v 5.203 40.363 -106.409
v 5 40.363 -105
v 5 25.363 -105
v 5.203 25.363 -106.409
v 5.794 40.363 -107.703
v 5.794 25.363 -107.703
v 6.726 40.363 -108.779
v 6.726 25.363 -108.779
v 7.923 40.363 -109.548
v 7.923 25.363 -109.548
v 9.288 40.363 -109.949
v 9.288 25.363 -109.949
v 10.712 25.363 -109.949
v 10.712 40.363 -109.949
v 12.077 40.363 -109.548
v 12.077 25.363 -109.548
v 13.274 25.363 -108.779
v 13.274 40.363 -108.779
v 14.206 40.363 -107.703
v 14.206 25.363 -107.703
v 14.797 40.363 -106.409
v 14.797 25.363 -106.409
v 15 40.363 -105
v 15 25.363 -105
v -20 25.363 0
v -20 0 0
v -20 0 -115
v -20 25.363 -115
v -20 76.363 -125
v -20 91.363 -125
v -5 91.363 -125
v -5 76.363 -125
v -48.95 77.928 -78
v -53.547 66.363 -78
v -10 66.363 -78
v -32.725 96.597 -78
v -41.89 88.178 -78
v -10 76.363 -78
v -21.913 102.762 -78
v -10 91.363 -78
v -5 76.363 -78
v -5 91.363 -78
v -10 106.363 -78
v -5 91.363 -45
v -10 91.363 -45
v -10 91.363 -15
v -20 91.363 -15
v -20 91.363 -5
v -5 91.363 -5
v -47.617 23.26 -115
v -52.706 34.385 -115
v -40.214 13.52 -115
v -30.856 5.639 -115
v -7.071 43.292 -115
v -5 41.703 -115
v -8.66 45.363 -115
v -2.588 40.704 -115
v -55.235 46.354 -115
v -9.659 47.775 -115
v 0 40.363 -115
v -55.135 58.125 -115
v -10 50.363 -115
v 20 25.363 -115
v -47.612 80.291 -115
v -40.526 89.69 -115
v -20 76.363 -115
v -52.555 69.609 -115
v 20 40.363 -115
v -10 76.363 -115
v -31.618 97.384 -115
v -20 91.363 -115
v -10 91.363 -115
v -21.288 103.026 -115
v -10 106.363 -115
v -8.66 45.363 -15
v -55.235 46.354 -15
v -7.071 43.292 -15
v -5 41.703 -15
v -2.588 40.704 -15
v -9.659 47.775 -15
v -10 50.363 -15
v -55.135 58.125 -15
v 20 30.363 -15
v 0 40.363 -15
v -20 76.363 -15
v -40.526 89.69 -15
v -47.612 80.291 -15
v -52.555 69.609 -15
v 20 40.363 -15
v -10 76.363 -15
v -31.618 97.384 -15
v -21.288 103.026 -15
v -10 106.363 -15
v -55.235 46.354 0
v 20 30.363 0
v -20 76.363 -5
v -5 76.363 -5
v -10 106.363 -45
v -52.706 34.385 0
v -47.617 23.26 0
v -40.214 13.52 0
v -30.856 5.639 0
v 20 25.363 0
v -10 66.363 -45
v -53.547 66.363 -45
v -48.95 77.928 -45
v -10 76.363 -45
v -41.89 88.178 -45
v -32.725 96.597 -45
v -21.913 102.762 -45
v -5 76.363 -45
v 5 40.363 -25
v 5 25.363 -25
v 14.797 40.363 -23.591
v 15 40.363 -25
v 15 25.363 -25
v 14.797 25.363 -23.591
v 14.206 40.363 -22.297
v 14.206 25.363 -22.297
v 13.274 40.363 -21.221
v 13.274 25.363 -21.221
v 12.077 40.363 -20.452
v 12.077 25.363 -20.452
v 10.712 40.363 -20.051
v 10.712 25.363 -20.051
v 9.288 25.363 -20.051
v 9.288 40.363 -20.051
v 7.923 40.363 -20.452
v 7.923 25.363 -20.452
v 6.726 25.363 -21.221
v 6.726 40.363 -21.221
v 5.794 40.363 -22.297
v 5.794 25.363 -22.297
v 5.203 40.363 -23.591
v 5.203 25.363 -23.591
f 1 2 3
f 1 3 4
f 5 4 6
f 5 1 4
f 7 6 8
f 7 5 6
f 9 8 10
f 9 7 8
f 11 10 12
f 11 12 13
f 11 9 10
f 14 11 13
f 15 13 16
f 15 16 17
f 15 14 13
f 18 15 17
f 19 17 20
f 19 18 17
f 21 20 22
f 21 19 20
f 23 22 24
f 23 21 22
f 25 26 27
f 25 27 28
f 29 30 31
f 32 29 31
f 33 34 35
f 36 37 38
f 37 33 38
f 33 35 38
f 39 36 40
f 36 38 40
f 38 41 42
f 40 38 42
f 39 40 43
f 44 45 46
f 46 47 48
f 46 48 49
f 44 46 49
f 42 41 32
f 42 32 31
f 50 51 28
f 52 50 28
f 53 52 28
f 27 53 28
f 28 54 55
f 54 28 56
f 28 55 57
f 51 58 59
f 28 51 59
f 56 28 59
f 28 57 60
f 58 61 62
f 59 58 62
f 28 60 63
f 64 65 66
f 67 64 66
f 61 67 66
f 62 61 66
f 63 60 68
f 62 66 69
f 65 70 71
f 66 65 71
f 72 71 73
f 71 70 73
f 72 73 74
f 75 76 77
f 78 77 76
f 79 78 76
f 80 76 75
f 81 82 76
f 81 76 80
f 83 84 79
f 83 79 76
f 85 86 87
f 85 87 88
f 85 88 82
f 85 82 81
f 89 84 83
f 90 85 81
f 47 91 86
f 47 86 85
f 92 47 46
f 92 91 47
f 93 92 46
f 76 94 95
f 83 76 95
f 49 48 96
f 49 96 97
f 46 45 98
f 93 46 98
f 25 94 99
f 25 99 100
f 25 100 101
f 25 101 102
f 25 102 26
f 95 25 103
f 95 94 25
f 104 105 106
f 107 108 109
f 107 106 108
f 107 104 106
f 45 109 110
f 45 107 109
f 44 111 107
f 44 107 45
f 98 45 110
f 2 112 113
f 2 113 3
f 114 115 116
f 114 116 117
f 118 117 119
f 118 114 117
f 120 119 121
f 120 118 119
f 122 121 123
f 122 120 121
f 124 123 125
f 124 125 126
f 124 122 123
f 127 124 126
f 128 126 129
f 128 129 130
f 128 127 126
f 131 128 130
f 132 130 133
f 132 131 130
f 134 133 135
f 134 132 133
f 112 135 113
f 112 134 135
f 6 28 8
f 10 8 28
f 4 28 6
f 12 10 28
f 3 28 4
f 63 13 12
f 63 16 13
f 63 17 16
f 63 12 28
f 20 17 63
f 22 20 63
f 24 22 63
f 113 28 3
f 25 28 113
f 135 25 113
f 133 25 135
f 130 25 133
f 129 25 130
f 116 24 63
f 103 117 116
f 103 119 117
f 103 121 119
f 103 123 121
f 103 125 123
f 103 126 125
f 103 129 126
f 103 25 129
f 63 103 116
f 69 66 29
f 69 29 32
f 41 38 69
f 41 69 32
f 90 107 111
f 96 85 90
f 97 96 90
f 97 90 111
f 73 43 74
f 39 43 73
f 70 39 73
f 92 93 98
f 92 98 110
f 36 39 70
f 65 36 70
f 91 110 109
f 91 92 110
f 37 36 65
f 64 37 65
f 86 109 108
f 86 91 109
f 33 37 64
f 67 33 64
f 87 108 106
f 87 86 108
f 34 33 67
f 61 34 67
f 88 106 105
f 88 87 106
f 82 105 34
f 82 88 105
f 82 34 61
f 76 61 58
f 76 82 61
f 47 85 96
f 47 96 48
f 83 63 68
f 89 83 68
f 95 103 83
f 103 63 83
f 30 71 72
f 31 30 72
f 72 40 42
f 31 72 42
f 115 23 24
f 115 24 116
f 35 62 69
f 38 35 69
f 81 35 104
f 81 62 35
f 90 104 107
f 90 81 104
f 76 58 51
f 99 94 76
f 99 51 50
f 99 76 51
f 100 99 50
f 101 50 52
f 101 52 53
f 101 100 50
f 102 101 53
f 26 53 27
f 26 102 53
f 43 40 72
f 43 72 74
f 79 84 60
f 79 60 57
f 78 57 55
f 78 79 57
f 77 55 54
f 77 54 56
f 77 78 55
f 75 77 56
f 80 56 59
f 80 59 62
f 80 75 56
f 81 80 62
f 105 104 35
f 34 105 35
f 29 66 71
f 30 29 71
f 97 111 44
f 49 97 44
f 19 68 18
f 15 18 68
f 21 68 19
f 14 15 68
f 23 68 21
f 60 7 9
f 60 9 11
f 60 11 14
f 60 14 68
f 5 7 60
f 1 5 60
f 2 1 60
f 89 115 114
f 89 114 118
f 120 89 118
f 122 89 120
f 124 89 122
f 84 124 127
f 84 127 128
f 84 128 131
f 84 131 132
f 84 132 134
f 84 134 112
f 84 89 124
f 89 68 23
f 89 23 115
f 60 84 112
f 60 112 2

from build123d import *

# Parameters (mm, degrees)
SKETCH1_W                = 10
SKETCH1_H                = 15
BOSS_EXTRUDE1_DEPTH      = 115
SKETCH1_5_W              = 10
SKETCH1_5_H              = 15
CUT_EXTRUDE1_DEPTH       = 15
SKETCH6_W                = 15
SKETCH6_H                = 15
BOSS_EXTRUDE3_DEPTH      = 52.5
BOSS_EXTRUDE3_DEPTH_BACK = 67.5
CUT_EXTRUDE2_REACH       = 52.5
SKETCH7_W                = 33
SKETCH7_H                = 40
CUT_EXTRUDE3_DEPTH       = 15


with BuildPart() as part:
    # Sketch1 → Boss-Extrude1 (new body)
    with BuildSketch(Plane.XY):
        with BuildLine():
            Line((-10, 91.362796982), (-10, 106.362796982))
            ThreePointArc((-10, 106.362796982), (-44.318751046, 85.179188449), (-55.235044142, 46.354499282))
            Line((-55.235044142, 46.354499282), (20, 30.362796982))
            Line((20, 30.362796982), (20, 40.362796982))
            Line((20, 40.362796982), (0, 40.362796982))
            ThreePointArc((0, 40.362796982), (-7.071067812, 43.29172917), (-10, 50.362796982))
            Line((-10, 50.362796982), (-10, 76.362796982))
            Line((-10, 76.362796982), (-20, 76.362796982))
            Line((-20, 76.362796982), (-20, 91.362796982))
            Line((-20, 91.362796982), (-10, 91.362796982))
        make_face()
        with BuildLine():
            Line((20, 30.362796982), (-55.235044142, 46.354499282))
            ThreePointArc((-55.235044142, 46.354499282), (-44.184418834, 18.185611269), (-20, 0))
            Line((-20, 0), (-20, 25.362796982))
            Line((-20, 25.362796982), (20, 25.362796982))
            Line((20, 25.362796982), (20, 30.362796982))
        make_face()
        with Locations((-15, 83.862796982)):
            Rectangle(SKETCH1_W, SKETCH1_H)
    extrude(amount=-BOSS_EXTRUDE1_DEPTH)

    # Sketch1<5> → Cut-Extrude1 (cut)
    with BuildSketch(Plane.XY):
        with BuildLine():
            Line((-10, 91.362796982), (-10, 106.362796982))
            ThreePointArc((-10, 106.362796982), (-44.318751046, 85.179188449), (-55.235044142, 46.354499282))
            Line((-55.235044142, 46.354499282), (20, 30.362796982))
            Line((20, 30.362796982), (20, 40.362796982))
            Line((20, 40.362796982), (0, 40.362796982))
            ThreePointArc((0, 40.362796982), (-7.071067812, 43.29172917), (-10, 50.362796982))
            Line((-10, 50.362796982), (-10, 76.362796982))
            Line((-10, 76.362796982), (-20, 76.362796982))
            Line((-20, 76.362796982), (-20, 91.362796982))
            Line((-20, 91.362796982), (-10, 91.362796982))
        make_face()
        with Locations((-15, 83.862796982)):
            Rectangle(SKETCH1_5_W, SKETCH1_5_H)
    extrude(amount=-CUT_EXTRUDE1_DEPTH, mode=Mode.SUBTRACT)

    # Sketch6 → Boss-Extrude3 (add, two sides)
    with BuildSketch(Plane.XY.offset(-57.5)) as boss_extrude3_sk:
        with Locations((-12.5, 83.862796982)):
            Rectangle(SKETCH6_W, SKETCH6_H)
    extrude(amount=BOSS_EXTRUDE3_DEPTH)
    extrude(boss_extrude3_sk.sketch, amount=-BOSS_EXTRUDE3_DEPTH_BACK)

    # Sketch7 → Cut-Extrude2 (cut, up to next)
    with BuildSketch(Plane(origin=(-5, 0, 0), x_dir=(0, 0, -1), z_dir=(1, 0, 0)), mode=Mode.PRIVATE) as cut_extrude2_sk1:
        with Locations((61.5, 86.362796982)):
            Rectangle(SKETCH7_W, SKETCH7_H)
    cut_extrude2_tool1 = extrude(cut_extrude2_sk1.sketch, amount=-CUT_EXTRUDE2_REACH, mode=Mode.PRIVATE) & part.part
    add(cut_extrude2_tool1.solids().sort_by_distance((-5, 86.362797, -61.5))[0], mode=Mode.SUBTRACT)

    # Sketch8 → Cut-Extrude3 (cut)
    with BuildSketch(Plane(origin=(0, 40.362796982, 0), x_dir=(1, 0, 0), z_dir=(0, 1, 0))):
        with BuildLine():
            Line((5, 25), (5, 105))
            ThreePointArc((5, 105), (10, 110), (15, 105))
            Line((15, 105), (15, 25))
            ThreePointArc((15, 25), (10, 20), (5, 25))
        make_face()
    extrude(amount=-CUT_EXTRUDE3_DEPTH, mode=Mode.SUBTRACT)


solid = part.part
